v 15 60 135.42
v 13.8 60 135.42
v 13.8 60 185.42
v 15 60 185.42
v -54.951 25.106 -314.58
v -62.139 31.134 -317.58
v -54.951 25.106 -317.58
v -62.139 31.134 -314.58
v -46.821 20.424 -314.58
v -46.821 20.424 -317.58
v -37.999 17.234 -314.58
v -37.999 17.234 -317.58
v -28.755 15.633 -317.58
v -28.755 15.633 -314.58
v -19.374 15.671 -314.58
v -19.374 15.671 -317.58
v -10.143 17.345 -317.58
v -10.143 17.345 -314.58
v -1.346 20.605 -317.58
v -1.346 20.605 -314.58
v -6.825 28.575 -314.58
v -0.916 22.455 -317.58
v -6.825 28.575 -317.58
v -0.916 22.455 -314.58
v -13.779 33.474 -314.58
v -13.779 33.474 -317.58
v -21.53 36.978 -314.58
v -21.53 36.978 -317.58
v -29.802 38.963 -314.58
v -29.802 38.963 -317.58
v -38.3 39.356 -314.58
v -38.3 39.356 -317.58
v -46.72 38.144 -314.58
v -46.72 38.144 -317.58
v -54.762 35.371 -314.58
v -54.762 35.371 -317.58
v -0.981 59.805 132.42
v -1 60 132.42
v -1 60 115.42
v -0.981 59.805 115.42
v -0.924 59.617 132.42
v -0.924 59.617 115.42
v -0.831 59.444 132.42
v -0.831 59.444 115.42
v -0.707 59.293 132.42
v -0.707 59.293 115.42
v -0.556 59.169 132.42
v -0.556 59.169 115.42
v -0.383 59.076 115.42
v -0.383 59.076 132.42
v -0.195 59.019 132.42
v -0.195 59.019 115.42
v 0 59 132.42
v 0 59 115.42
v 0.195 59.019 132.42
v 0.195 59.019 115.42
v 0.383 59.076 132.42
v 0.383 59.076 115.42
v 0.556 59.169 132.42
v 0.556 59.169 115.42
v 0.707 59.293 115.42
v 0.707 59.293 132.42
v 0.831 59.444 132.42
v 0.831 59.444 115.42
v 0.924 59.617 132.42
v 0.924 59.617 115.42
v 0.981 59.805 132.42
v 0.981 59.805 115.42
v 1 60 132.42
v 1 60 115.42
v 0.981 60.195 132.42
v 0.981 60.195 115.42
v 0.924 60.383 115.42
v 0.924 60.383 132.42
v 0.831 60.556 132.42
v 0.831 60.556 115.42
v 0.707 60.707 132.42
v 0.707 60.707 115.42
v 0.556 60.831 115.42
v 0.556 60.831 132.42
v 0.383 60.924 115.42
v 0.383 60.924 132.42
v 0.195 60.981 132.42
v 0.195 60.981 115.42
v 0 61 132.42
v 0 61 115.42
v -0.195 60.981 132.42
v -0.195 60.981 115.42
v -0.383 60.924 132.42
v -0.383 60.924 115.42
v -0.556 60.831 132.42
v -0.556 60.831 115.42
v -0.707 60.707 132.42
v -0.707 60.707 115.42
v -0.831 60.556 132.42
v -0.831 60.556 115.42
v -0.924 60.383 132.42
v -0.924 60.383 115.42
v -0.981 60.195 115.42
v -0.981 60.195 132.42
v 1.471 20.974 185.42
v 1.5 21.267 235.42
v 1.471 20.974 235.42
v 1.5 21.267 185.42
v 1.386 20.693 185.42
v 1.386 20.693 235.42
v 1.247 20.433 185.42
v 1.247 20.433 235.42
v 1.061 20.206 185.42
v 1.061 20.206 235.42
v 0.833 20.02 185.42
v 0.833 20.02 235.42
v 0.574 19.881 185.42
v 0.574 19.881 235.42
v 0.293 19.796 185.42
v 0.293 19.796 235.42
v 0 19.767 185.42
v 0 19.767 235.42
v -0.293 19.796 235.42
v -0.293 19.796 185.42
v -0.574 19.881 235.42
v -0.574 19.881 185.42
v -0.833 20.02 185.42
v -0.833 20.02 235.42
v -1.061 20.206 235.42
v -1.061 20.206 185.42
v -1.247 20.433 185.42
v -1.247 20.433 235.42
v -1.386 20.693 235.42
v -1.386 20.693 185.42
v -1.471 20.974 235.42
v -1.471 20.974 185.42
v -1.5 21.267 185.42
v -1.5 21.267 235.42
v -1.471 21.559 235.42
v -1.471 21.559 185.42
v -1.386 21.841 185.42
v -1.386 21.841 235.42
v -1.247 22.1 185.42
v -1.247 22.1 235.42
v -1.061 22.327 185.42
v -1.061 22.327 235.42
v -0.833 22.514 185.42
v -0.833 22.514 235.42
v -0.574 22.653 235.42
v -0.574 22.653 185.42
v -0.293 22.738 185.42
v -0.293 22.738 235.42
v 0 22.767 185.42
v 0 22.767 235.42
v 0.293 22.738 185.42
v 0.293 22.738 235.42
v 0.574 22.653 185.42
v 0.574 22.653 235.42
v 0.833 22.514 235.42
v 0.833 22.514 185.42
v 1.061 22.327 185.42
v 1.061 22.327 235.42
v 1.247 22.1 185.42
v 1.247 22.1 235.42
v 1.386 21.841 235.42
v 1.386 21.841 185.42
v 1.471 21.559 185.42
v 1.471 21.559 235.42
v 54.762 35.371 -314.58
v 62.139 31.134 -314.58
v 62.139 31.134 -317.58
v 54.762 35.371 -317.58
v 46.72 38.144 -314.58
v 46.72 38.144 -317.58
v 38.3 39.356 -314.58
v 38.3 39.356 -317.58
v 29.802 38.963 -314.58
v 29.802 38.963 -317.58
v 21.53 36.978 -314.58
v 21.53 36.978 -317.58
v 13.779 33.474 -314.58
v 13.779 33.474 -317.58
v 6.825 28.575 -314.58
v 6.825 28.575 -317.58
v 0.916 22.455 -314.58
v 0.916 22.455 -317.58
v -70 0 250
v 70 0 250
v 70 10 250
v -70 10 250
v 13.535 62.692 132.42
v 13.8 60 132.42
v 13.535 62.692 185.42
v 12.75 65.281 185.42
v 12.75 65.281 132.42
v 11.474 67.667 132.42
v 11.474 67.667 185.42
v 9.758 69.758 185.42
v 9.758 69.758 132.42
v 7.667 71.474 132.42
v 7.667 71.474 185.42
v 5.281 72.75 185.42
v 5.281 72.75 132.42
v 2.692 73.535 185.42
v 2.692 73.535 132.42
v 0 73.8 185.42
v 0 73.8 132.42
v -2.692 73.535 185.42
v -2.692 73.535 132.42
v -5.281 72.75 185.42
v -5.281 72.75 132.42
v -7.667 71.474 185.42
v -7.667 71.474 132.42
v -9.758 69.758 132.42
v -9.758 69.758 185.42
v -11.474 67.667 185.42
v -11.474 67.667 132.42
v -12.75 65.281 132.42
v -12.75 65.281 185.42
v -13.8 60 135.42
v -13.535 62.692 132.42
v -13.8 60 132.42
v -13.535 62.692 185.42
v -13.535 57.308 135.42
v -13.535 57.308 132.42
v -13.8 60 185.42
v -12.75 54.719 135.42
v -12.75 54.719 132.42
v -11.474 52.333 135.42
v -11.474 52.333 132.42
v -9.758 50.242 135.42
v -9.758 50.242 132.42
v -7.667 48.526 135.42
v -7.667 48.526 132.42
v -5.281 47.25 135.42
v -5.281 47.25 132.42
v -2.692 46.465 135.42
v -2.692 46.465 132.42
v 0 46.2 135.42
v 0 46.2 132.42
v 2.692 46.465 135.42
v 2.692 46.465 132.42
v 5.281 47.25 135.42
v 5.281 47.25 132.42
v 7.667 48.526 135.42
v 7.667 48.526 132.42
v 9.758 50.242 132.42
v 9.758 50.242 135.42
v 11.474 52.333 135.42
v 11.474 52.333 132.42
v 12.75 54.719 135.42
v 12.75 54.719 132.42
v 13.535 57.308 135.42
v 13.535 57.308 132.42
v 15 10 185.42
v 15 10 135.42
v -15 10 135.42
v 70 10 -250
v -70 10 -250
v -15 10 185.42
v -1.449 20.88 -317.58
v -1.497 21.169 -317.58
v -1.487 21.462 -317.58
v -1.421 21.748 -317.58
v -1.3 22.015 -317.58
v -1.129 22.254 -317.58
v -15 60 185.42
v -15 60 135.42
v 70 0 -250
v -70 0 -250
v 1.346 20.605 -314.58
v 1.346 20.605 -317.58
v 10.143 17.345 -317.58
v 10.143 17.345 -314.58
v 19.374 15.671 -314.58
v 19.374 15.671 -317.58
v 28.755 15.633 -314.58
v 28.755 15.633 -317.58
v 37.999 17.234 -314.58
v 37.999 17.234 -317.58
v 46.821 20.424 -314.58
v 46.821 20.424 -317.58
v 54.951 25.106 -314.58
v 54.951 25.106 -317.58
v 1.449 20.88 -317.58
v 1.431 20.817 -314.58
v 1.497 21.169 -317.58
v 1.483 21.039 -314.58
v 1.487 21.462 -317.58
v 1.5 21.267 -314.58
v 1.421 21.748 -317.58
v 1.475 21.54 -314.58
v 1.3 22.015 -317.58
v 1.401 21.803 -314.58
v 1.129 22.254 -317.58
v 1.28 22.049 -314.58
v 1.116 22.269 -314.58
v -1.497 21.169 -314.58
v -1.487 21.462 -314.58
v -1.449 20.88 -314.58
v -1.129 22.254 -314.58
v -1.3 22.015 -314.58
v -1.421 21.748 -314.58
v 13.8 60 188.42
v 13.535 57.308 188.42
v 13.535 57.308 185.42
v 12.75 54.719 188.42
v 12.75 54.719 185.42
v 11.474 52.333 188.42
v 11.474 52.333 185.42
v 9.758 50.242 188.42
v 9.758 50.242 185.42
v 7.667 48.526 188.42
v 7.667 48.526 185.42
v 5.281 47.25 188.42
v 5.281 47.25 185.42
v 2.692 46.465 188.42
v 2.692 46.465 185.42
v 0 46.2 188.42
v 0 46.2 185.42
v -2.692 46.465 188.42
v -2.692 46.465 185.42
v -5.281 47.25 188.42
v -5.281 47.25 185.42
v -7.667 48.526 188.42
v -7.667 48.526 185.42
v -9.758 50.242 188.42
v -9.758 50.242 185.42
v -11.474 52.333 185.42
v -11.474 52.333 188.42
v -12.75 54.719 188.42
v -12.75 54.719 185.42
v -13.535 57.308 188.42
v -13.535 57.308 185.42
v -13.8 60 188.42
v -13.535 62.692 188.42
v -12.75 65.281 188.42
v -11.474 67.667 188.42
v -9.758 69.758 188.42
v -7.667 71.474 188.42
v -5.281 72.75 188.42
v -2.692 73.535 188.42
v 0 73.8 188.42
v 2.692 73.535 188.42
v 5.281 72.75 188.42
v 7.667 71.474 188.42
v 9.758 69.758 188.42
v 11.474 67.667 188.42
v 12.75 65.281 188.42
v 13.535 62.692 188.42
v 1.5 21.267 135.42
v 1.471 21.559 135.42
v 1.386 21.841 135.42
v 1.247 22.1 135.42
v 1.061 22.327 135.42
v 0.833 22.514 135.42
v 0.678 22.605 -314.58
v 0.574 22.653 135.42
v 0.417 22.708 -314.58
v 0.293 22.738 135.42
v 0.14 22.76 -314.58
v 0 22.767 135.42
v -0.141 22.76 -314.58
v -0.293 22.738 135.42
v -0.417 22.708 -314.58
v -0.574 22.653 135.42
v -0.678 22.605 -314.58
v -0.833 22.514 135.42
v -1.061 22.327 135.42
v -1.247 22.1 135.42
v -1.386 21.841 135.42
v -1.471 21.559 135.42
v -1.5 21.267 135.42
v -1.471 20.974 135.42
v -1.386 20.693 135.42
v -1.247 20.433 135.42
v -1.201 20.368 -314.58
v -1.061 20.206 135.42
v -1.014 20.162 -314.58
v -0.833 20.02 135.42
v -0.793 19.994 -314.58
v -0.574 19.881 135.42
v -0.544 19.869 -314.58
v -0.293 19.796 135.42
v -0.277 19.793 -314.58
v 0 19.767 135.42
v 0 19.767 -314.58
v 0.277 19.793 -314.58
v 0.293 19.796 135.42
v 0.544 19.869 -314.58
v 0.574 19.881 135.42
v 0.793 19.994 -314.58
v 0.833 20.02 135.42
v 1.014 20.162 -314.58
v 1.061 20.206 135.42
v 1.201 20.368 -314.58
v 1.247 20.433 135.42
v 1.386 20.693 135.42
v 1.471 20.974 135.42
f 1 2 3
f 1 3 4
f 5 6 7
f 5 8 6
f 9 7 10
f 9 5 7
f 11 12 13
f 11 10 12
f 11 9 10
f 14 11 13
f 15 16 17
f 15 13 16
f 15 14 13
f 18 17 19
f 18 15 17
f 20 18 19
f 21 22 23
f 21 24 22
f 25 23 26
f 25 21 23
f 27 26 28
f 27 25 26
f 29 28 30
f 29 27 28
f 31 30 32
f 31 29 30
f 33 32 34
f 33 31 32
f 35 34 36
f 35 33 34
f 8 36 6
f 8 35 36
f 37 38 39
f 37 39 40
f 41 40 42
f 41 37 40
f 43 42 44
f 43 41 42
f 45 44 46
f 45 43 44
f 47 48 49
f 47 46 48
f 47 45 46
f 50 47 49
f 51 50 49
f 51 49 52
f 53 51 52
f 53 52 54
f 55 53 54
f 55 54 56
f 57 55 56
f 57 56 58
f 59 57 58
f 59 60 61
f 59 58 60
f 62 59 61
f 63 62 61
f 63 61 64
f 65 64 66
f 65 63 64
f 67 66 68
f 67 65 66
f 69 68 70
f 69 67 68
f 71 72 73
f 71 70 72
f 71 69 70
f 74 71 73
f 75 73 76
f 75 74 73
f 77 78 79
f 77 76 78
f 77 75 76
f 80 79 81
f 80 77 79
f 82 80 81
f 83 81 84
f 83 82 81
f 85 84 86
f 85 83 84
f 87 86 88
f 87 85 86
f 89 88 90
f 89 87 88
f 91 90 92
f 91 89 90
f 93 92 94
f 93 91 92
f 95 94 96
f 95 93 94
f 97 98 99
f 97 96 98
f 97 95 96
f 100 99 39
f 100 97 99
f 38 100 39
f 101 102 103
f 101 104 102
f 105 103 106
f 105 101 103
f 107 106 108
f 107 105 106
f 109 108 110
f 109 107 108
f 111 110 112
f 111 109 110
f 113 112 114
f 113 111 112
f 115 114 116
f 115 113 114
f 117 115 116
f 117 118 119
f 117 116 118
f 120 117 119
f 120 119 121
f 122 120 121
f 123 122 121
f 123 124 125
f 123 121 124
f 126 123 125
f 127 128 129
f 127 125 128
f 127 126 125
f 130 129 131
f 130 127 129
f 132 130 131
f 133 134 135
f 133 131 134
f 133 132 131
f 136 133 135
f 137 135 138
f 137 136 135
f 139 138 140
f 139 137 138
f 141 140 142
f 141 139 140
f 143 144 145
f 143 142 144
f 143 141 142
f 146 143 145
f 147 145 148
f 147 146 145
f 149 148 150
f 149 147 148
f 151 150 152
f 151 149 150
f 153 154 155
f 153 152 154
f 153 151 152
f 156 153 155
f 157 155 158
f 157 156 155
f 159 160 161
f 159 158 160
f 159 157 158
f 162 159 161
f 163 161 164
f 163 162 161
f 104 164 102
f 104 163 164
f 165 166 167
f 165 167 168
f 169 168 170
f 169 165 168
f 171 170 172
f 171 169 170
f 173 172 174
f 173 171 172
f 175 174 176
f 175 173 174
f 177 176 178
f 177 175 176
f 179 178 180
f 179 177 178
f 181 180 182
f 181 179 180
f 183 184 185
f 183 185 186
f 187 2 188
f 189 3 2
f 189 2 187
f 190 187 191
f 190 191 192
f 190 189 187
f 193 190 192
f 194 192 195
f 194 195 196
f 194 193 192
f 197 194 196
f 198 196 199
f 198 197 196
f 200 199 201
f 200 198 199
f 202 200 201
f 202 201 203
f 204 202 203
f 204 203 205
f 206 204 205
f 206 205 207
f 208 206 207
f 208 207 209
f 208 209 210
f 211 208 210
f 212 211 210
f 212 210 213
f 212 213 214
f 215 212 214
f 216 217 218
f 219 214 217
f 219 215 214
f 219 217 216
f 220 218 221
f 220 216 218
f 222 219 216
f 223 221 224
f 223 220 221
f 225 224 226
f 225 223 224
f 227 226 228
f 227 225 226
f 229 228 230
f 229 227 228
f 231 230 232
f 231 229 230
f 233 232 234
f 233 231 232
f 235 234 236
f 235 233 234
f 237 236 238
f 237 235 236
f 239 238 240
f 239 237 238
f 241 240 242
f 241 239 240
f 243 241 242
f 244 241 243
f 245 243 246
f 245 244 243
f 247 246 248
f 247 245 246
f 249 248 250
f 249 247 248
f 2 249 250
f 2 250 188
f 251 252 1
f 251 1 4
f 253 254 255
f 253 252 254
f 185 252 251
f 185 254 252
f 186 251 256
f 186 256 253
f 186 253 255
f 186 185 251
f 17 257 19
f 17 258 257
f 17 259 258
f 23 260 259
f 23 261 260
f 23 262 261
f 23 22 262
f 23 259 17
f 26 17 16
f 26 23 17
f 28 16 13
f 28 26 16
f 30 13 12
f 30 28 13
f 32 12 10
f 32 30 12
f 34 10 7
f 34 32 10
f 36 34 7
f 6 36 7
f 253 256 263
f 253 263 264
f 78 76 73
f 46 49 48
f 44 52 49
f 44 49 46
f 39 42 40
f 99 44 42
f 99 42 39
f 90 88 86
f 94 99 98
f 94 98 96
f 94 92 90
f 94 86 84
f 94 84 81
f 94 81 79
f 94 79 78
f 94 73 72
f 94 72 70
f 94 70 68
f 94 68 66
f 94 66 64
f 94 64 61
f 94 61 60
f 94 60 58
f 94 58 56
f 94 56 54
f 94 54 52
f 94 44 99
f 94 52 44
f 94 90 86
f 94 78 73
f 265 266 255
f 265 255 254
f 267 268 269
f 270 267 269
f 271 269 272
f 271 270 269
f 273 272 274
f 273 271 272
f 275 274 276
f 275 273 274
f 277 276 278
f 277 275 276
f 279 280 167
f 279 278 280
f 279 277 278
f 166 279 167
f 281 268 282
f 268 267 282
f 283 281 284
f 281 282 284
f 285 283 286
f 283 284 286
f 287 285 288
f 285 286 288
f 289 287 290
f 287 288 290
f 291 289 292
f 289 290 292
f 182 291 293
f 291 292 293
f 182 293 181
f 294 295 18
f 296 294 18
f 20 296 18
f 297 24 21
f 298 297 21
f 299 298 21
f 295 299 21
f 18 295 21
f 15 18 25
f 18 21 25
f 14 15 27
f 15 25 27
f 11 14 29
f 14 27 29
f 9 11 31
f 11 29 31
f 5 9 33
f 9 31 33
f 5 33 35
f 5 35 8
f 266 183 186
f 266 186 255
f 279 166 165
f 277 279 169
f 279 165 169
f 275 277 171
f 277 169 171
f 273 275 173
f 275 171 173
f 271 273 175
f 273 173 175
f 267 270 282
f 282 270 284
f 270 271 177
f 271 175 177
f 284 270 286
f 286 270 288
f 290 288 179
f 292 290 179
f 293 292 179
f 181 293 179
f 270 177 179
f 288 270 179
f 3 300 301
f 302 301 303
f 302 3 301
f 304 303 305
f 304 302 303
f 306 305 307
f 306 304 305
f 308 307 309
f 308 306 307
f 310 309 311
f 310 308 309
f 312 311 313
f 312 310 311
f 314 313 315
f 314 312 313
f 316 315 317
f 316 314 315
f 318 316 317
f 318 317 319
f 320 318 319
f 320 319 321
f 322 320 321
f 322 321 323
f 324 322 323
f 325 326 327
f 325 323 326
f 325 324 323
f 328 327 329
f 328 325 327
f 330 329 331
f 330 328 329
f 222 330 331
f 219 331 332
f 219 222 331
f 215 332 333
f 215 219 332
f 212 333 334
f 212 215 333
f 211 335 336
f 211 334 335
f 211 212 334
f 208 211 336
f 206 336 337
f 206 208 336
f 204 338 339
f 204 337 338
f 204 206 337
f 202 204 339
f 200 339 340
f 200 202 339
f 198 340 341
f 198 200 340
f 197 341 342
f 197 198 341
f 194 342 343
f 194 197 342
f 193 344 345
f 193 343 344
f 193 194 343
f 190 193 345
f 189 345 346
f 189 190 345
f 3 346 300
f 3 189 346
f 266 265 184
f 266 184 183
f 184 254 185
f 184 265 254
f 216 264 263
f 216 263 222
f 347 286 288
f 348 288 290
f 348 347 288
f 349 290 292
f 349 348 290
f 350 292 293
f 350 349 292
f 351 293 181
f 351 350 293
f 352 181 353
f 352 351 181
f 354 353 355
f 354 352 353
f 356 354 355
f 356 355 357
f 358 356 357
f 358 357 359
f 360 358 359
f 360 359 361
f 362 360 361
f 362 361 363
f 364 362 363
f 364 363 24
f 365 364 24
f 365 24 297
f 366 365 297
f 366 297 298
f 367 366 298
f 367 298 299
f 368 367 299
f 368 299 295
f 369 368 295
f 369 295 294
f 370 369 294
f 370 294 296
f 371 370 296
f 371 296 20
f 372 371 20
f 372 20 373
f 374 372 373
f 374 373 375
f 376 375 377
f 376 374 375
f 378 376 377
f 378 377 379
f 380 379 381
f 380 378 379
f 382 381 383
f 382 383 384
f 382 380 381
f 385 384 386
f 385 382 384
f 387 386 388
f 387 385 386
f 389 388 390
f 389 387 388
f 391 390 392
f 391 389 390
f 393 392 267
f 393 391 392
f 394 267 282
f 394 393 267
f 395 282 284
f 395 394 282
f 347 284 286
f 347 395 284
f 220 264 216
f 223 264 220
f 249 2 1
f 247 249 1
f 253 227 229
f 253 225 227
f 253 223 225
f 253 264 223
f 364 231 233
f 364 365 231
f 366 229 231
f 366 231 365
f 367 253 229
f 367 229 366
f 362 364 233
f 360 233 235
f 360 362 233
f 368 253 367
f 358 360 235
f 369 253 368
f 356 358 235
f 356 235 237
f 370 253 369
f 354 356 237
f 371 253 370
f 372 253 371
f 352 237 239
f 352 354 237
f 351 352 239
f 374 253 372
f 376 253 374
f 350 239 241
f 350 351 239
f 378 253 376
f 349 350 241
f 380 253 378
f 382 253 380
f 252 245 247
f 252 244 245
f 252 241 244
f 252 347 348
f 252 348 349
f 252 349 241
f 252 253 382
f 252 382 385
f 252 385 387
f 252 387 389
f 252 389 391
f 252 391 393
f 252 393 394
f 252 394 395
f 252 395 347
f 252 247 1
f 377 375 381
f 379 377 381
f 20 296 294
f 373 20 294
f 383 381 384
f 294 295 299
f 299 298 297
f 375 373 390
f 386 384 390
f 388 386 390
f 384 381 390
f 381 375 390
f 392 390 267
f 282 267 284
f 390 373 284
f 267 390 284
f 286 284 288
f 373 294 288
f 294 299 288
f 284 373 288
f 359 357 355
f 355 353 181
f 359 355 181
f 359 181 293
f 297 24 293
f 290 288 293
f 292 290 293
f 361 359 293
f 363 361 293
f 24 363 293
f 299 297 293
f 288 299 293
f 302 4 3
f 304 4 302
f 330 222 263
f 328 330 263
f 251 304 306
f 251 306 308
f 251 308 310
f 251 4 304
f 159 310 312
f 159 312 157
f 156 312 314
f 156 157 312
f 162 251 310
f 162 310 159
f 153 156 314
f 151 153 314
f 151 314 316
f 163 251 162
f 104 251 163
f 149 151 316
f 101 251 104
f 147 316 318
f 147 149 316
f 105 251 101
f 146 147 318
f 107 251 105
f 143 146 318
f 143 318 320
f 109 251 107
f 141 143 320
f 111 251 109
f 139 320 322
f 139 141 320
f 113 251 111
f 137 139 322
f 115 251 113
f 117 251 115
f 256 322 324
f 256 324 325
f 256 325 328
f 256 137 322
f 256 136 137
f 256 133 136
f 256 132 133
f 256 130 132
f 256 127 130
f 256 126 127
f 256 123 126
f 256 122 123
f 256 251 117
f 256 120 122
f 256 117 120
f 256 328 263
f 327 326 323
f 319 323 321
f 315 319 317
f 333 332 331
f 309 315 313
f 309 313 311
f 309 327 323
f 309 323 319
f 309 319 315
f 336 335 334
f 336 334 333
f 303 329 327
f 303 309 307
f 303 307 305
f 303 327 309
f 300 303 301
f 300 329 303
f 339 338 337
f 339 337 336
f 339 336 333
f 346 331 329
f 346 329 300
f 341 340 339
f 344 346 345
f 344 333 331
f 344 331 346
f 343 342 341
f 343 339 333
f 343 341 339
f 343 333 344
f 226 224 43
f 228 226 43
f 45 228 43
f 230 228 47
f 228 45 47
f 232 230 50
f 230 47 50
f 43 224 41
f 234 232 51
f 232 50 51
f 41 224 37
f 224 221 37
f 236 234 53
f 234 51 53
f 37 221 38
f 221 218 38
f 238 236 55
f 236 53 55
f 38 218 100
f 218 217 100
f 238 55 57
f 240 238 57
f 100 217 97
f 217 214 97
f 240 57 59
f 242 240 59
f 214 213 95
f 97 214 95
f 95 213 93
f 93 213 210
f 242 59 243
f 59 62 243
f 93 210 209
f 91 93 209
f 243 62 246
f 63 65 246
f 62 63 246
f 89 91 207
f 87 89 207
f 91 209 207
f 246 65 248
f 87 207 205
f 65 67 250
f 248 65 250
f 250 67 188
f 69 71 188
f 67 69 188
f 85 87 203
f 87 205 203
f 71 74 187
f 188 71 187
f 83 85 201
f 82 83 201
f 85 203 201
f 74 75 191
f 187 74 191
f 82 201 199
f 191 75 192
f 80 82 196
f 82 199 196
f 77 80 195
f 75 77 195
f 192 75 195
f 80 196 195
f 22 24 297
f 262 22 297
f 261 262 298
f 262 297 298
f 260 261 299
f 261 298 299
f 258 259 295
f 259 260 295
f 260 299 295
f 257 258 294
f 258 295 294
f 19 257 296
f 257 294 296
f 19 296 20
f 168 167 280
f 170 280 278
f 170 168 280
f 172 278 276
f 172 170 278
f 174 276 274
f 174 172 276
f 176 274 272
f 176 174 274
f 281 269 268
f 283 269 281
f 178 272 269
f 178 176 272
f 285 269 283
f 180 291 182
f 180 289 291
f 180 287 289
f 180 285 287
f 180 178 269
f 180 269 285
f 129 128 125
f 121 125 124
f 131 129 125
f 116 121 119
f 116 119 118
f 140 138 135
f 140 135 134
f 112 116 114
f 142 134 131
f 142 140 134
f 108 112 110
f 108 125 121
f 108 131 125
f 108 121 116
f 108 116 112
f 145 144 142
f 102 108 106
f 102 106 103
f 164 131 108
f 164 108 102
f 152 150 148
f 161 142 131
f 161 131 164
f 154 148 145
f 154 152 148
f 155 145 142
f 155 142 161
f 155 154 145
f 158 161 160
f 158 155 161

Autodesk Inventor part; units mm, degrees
ref_plane "YZ Plane" through (0, 0, 0) normal (1, 0, 0) x (0, 1, 0)
ref_plane "XZ Plane" through (0, 0, 0) normal (0, 1, 0) x (-1, 0, 0)
ref_plane "XY Plane" through (0, 0, 0) normal (0, 0, 1) x (1, 0, 0)
sketch "Sketch1" plane through (0, 0, 0) normal (0, 1, 0) x (-1, 0, 0)
  line L0 (-70, 250) -> (70, 250)
  line L1 (70, 250) -> (70, -250)
  line L2 (70, -250) -> (-70, -250)
  line L3 (-70, -250) -> (-70, 250)
  line L4 (-70, 250) -> (70, -250) construction
  line L5 (70, 250) -> (-70, -250) construction
  point P0 (0, 0)
  dimension "d0" = 140
  dimension "d1" = 500
extrude "Extrusion1" add sketch "Sketch1" along normal blind 10
sketch "Sketch2" plane through (0, 10, 0) normal (0, 1, 0) x (1, 0, 0)
  line L0 (15, -185.42) -> (-15, -185.42)
  line L1 (-15, -185.42) -> (-15, -135.42)
  line L2 (-15, -135.42) -> (15, -135.42)
  line L3 (15, -135.42) -> (15, -185.42)
  line L4 (15, -185.42) -> (-15, -135.42) construction
  line L5 (-15, -185.42) -> (15, -135.42) construction
  point P0 (0, 0)
  point P1 (0, -160.42)
  dimension "d4" = 30
  dimension "d5" = 50
extrude "Extrusion2" add sketch "Sketch2" along normal blind 50
sketch "Sketch3" plane through (15, 10, 135.42) normal (0, 0, -1) x (-1, 0, 0)
  line L0 (30, 50) -> (0, 50) projected
  circle A0 centre (15, 50) radius 13.8
  point P0 (15, -10)
  point P1 (1.2, 50)
  point P2 (28.8, 50)
  dimension "d8" = 27.6
extrude "Extrusion3" cut sketch "Sketch3" against normal blind 50 contours A0 L0 picked at (18.5768, 45.8488)
sketch "Sketch4" plane through (-15, 10, 185.42) normal (0, 0, 1) x (1, 0, 0)
  circle A0 centre (15, 11.2668) radius 1.5
  point P0 (15, -10)
  dimension "d11" = 3
extrude "Extrusion5" add sketch "Sketch4" along normal blind 50 and the other way blind 500
sketch "Sketch5" plane through (0, 21.2668, -314.58) normal (0, 0, -1) x (-1, 0, 0)
  circle A0 centre (0, 0) radius 1.5 projected
  arc A1 (62.1392, 9.8676) -> (0, 0) centre (36.1239, -26.8945) ccw
  arc A2 (0, 0) -> (62.1392, 9.8676) centre (24.2766, 47.7112) ccw
  arc A3 (0, 0) -> (-62.1392, 9.8676) centre (-36.1239, -26.8945) ccw
  arc A4 (-62.1392, 9.8676) -> (0, 0) centre (-24.2766, 47.7112) ccw
  point P0 (0, -21.2668)
  point P1 (1.3463, -0.6614)
  point P2 (0.9157, 1.1881)
  point P3 (-1.3463, -0.6614)
  point P4 (-0.9157, 1.1881)
extrude "Extrusion6" add sketch "Sketch5" along normal blind 3 contours A0 A1 A2 | A0 A4 A3 picked at (32.1855, 2.6766) picked at (-32.1855, 2.6766)
sketch "Sketch6" plane through (-15, 10, 185.42) normal (0, 0, 1) x (1, 0, 0)
  circle A0 centre (15, 50) radius 13.8
  point P0 (15, -10)
  dimension "d22" = 27.6
extrude "Extrusion7" add sketch "Sketch6" along normal blind 3 and the other way blind 53
sketch "Sketch7" plane through (0, 60, 132.42) normal (0, 0, -1) x (-1, 0, 0)
  circle A0 centre (0, 0) radius 1
  point P0 (0, -60)
  dimension "d27" = 2
extrude "Extrusion8" add sketch "Sketch7" along normal blind 17
properties part number "Motor Shaft"
